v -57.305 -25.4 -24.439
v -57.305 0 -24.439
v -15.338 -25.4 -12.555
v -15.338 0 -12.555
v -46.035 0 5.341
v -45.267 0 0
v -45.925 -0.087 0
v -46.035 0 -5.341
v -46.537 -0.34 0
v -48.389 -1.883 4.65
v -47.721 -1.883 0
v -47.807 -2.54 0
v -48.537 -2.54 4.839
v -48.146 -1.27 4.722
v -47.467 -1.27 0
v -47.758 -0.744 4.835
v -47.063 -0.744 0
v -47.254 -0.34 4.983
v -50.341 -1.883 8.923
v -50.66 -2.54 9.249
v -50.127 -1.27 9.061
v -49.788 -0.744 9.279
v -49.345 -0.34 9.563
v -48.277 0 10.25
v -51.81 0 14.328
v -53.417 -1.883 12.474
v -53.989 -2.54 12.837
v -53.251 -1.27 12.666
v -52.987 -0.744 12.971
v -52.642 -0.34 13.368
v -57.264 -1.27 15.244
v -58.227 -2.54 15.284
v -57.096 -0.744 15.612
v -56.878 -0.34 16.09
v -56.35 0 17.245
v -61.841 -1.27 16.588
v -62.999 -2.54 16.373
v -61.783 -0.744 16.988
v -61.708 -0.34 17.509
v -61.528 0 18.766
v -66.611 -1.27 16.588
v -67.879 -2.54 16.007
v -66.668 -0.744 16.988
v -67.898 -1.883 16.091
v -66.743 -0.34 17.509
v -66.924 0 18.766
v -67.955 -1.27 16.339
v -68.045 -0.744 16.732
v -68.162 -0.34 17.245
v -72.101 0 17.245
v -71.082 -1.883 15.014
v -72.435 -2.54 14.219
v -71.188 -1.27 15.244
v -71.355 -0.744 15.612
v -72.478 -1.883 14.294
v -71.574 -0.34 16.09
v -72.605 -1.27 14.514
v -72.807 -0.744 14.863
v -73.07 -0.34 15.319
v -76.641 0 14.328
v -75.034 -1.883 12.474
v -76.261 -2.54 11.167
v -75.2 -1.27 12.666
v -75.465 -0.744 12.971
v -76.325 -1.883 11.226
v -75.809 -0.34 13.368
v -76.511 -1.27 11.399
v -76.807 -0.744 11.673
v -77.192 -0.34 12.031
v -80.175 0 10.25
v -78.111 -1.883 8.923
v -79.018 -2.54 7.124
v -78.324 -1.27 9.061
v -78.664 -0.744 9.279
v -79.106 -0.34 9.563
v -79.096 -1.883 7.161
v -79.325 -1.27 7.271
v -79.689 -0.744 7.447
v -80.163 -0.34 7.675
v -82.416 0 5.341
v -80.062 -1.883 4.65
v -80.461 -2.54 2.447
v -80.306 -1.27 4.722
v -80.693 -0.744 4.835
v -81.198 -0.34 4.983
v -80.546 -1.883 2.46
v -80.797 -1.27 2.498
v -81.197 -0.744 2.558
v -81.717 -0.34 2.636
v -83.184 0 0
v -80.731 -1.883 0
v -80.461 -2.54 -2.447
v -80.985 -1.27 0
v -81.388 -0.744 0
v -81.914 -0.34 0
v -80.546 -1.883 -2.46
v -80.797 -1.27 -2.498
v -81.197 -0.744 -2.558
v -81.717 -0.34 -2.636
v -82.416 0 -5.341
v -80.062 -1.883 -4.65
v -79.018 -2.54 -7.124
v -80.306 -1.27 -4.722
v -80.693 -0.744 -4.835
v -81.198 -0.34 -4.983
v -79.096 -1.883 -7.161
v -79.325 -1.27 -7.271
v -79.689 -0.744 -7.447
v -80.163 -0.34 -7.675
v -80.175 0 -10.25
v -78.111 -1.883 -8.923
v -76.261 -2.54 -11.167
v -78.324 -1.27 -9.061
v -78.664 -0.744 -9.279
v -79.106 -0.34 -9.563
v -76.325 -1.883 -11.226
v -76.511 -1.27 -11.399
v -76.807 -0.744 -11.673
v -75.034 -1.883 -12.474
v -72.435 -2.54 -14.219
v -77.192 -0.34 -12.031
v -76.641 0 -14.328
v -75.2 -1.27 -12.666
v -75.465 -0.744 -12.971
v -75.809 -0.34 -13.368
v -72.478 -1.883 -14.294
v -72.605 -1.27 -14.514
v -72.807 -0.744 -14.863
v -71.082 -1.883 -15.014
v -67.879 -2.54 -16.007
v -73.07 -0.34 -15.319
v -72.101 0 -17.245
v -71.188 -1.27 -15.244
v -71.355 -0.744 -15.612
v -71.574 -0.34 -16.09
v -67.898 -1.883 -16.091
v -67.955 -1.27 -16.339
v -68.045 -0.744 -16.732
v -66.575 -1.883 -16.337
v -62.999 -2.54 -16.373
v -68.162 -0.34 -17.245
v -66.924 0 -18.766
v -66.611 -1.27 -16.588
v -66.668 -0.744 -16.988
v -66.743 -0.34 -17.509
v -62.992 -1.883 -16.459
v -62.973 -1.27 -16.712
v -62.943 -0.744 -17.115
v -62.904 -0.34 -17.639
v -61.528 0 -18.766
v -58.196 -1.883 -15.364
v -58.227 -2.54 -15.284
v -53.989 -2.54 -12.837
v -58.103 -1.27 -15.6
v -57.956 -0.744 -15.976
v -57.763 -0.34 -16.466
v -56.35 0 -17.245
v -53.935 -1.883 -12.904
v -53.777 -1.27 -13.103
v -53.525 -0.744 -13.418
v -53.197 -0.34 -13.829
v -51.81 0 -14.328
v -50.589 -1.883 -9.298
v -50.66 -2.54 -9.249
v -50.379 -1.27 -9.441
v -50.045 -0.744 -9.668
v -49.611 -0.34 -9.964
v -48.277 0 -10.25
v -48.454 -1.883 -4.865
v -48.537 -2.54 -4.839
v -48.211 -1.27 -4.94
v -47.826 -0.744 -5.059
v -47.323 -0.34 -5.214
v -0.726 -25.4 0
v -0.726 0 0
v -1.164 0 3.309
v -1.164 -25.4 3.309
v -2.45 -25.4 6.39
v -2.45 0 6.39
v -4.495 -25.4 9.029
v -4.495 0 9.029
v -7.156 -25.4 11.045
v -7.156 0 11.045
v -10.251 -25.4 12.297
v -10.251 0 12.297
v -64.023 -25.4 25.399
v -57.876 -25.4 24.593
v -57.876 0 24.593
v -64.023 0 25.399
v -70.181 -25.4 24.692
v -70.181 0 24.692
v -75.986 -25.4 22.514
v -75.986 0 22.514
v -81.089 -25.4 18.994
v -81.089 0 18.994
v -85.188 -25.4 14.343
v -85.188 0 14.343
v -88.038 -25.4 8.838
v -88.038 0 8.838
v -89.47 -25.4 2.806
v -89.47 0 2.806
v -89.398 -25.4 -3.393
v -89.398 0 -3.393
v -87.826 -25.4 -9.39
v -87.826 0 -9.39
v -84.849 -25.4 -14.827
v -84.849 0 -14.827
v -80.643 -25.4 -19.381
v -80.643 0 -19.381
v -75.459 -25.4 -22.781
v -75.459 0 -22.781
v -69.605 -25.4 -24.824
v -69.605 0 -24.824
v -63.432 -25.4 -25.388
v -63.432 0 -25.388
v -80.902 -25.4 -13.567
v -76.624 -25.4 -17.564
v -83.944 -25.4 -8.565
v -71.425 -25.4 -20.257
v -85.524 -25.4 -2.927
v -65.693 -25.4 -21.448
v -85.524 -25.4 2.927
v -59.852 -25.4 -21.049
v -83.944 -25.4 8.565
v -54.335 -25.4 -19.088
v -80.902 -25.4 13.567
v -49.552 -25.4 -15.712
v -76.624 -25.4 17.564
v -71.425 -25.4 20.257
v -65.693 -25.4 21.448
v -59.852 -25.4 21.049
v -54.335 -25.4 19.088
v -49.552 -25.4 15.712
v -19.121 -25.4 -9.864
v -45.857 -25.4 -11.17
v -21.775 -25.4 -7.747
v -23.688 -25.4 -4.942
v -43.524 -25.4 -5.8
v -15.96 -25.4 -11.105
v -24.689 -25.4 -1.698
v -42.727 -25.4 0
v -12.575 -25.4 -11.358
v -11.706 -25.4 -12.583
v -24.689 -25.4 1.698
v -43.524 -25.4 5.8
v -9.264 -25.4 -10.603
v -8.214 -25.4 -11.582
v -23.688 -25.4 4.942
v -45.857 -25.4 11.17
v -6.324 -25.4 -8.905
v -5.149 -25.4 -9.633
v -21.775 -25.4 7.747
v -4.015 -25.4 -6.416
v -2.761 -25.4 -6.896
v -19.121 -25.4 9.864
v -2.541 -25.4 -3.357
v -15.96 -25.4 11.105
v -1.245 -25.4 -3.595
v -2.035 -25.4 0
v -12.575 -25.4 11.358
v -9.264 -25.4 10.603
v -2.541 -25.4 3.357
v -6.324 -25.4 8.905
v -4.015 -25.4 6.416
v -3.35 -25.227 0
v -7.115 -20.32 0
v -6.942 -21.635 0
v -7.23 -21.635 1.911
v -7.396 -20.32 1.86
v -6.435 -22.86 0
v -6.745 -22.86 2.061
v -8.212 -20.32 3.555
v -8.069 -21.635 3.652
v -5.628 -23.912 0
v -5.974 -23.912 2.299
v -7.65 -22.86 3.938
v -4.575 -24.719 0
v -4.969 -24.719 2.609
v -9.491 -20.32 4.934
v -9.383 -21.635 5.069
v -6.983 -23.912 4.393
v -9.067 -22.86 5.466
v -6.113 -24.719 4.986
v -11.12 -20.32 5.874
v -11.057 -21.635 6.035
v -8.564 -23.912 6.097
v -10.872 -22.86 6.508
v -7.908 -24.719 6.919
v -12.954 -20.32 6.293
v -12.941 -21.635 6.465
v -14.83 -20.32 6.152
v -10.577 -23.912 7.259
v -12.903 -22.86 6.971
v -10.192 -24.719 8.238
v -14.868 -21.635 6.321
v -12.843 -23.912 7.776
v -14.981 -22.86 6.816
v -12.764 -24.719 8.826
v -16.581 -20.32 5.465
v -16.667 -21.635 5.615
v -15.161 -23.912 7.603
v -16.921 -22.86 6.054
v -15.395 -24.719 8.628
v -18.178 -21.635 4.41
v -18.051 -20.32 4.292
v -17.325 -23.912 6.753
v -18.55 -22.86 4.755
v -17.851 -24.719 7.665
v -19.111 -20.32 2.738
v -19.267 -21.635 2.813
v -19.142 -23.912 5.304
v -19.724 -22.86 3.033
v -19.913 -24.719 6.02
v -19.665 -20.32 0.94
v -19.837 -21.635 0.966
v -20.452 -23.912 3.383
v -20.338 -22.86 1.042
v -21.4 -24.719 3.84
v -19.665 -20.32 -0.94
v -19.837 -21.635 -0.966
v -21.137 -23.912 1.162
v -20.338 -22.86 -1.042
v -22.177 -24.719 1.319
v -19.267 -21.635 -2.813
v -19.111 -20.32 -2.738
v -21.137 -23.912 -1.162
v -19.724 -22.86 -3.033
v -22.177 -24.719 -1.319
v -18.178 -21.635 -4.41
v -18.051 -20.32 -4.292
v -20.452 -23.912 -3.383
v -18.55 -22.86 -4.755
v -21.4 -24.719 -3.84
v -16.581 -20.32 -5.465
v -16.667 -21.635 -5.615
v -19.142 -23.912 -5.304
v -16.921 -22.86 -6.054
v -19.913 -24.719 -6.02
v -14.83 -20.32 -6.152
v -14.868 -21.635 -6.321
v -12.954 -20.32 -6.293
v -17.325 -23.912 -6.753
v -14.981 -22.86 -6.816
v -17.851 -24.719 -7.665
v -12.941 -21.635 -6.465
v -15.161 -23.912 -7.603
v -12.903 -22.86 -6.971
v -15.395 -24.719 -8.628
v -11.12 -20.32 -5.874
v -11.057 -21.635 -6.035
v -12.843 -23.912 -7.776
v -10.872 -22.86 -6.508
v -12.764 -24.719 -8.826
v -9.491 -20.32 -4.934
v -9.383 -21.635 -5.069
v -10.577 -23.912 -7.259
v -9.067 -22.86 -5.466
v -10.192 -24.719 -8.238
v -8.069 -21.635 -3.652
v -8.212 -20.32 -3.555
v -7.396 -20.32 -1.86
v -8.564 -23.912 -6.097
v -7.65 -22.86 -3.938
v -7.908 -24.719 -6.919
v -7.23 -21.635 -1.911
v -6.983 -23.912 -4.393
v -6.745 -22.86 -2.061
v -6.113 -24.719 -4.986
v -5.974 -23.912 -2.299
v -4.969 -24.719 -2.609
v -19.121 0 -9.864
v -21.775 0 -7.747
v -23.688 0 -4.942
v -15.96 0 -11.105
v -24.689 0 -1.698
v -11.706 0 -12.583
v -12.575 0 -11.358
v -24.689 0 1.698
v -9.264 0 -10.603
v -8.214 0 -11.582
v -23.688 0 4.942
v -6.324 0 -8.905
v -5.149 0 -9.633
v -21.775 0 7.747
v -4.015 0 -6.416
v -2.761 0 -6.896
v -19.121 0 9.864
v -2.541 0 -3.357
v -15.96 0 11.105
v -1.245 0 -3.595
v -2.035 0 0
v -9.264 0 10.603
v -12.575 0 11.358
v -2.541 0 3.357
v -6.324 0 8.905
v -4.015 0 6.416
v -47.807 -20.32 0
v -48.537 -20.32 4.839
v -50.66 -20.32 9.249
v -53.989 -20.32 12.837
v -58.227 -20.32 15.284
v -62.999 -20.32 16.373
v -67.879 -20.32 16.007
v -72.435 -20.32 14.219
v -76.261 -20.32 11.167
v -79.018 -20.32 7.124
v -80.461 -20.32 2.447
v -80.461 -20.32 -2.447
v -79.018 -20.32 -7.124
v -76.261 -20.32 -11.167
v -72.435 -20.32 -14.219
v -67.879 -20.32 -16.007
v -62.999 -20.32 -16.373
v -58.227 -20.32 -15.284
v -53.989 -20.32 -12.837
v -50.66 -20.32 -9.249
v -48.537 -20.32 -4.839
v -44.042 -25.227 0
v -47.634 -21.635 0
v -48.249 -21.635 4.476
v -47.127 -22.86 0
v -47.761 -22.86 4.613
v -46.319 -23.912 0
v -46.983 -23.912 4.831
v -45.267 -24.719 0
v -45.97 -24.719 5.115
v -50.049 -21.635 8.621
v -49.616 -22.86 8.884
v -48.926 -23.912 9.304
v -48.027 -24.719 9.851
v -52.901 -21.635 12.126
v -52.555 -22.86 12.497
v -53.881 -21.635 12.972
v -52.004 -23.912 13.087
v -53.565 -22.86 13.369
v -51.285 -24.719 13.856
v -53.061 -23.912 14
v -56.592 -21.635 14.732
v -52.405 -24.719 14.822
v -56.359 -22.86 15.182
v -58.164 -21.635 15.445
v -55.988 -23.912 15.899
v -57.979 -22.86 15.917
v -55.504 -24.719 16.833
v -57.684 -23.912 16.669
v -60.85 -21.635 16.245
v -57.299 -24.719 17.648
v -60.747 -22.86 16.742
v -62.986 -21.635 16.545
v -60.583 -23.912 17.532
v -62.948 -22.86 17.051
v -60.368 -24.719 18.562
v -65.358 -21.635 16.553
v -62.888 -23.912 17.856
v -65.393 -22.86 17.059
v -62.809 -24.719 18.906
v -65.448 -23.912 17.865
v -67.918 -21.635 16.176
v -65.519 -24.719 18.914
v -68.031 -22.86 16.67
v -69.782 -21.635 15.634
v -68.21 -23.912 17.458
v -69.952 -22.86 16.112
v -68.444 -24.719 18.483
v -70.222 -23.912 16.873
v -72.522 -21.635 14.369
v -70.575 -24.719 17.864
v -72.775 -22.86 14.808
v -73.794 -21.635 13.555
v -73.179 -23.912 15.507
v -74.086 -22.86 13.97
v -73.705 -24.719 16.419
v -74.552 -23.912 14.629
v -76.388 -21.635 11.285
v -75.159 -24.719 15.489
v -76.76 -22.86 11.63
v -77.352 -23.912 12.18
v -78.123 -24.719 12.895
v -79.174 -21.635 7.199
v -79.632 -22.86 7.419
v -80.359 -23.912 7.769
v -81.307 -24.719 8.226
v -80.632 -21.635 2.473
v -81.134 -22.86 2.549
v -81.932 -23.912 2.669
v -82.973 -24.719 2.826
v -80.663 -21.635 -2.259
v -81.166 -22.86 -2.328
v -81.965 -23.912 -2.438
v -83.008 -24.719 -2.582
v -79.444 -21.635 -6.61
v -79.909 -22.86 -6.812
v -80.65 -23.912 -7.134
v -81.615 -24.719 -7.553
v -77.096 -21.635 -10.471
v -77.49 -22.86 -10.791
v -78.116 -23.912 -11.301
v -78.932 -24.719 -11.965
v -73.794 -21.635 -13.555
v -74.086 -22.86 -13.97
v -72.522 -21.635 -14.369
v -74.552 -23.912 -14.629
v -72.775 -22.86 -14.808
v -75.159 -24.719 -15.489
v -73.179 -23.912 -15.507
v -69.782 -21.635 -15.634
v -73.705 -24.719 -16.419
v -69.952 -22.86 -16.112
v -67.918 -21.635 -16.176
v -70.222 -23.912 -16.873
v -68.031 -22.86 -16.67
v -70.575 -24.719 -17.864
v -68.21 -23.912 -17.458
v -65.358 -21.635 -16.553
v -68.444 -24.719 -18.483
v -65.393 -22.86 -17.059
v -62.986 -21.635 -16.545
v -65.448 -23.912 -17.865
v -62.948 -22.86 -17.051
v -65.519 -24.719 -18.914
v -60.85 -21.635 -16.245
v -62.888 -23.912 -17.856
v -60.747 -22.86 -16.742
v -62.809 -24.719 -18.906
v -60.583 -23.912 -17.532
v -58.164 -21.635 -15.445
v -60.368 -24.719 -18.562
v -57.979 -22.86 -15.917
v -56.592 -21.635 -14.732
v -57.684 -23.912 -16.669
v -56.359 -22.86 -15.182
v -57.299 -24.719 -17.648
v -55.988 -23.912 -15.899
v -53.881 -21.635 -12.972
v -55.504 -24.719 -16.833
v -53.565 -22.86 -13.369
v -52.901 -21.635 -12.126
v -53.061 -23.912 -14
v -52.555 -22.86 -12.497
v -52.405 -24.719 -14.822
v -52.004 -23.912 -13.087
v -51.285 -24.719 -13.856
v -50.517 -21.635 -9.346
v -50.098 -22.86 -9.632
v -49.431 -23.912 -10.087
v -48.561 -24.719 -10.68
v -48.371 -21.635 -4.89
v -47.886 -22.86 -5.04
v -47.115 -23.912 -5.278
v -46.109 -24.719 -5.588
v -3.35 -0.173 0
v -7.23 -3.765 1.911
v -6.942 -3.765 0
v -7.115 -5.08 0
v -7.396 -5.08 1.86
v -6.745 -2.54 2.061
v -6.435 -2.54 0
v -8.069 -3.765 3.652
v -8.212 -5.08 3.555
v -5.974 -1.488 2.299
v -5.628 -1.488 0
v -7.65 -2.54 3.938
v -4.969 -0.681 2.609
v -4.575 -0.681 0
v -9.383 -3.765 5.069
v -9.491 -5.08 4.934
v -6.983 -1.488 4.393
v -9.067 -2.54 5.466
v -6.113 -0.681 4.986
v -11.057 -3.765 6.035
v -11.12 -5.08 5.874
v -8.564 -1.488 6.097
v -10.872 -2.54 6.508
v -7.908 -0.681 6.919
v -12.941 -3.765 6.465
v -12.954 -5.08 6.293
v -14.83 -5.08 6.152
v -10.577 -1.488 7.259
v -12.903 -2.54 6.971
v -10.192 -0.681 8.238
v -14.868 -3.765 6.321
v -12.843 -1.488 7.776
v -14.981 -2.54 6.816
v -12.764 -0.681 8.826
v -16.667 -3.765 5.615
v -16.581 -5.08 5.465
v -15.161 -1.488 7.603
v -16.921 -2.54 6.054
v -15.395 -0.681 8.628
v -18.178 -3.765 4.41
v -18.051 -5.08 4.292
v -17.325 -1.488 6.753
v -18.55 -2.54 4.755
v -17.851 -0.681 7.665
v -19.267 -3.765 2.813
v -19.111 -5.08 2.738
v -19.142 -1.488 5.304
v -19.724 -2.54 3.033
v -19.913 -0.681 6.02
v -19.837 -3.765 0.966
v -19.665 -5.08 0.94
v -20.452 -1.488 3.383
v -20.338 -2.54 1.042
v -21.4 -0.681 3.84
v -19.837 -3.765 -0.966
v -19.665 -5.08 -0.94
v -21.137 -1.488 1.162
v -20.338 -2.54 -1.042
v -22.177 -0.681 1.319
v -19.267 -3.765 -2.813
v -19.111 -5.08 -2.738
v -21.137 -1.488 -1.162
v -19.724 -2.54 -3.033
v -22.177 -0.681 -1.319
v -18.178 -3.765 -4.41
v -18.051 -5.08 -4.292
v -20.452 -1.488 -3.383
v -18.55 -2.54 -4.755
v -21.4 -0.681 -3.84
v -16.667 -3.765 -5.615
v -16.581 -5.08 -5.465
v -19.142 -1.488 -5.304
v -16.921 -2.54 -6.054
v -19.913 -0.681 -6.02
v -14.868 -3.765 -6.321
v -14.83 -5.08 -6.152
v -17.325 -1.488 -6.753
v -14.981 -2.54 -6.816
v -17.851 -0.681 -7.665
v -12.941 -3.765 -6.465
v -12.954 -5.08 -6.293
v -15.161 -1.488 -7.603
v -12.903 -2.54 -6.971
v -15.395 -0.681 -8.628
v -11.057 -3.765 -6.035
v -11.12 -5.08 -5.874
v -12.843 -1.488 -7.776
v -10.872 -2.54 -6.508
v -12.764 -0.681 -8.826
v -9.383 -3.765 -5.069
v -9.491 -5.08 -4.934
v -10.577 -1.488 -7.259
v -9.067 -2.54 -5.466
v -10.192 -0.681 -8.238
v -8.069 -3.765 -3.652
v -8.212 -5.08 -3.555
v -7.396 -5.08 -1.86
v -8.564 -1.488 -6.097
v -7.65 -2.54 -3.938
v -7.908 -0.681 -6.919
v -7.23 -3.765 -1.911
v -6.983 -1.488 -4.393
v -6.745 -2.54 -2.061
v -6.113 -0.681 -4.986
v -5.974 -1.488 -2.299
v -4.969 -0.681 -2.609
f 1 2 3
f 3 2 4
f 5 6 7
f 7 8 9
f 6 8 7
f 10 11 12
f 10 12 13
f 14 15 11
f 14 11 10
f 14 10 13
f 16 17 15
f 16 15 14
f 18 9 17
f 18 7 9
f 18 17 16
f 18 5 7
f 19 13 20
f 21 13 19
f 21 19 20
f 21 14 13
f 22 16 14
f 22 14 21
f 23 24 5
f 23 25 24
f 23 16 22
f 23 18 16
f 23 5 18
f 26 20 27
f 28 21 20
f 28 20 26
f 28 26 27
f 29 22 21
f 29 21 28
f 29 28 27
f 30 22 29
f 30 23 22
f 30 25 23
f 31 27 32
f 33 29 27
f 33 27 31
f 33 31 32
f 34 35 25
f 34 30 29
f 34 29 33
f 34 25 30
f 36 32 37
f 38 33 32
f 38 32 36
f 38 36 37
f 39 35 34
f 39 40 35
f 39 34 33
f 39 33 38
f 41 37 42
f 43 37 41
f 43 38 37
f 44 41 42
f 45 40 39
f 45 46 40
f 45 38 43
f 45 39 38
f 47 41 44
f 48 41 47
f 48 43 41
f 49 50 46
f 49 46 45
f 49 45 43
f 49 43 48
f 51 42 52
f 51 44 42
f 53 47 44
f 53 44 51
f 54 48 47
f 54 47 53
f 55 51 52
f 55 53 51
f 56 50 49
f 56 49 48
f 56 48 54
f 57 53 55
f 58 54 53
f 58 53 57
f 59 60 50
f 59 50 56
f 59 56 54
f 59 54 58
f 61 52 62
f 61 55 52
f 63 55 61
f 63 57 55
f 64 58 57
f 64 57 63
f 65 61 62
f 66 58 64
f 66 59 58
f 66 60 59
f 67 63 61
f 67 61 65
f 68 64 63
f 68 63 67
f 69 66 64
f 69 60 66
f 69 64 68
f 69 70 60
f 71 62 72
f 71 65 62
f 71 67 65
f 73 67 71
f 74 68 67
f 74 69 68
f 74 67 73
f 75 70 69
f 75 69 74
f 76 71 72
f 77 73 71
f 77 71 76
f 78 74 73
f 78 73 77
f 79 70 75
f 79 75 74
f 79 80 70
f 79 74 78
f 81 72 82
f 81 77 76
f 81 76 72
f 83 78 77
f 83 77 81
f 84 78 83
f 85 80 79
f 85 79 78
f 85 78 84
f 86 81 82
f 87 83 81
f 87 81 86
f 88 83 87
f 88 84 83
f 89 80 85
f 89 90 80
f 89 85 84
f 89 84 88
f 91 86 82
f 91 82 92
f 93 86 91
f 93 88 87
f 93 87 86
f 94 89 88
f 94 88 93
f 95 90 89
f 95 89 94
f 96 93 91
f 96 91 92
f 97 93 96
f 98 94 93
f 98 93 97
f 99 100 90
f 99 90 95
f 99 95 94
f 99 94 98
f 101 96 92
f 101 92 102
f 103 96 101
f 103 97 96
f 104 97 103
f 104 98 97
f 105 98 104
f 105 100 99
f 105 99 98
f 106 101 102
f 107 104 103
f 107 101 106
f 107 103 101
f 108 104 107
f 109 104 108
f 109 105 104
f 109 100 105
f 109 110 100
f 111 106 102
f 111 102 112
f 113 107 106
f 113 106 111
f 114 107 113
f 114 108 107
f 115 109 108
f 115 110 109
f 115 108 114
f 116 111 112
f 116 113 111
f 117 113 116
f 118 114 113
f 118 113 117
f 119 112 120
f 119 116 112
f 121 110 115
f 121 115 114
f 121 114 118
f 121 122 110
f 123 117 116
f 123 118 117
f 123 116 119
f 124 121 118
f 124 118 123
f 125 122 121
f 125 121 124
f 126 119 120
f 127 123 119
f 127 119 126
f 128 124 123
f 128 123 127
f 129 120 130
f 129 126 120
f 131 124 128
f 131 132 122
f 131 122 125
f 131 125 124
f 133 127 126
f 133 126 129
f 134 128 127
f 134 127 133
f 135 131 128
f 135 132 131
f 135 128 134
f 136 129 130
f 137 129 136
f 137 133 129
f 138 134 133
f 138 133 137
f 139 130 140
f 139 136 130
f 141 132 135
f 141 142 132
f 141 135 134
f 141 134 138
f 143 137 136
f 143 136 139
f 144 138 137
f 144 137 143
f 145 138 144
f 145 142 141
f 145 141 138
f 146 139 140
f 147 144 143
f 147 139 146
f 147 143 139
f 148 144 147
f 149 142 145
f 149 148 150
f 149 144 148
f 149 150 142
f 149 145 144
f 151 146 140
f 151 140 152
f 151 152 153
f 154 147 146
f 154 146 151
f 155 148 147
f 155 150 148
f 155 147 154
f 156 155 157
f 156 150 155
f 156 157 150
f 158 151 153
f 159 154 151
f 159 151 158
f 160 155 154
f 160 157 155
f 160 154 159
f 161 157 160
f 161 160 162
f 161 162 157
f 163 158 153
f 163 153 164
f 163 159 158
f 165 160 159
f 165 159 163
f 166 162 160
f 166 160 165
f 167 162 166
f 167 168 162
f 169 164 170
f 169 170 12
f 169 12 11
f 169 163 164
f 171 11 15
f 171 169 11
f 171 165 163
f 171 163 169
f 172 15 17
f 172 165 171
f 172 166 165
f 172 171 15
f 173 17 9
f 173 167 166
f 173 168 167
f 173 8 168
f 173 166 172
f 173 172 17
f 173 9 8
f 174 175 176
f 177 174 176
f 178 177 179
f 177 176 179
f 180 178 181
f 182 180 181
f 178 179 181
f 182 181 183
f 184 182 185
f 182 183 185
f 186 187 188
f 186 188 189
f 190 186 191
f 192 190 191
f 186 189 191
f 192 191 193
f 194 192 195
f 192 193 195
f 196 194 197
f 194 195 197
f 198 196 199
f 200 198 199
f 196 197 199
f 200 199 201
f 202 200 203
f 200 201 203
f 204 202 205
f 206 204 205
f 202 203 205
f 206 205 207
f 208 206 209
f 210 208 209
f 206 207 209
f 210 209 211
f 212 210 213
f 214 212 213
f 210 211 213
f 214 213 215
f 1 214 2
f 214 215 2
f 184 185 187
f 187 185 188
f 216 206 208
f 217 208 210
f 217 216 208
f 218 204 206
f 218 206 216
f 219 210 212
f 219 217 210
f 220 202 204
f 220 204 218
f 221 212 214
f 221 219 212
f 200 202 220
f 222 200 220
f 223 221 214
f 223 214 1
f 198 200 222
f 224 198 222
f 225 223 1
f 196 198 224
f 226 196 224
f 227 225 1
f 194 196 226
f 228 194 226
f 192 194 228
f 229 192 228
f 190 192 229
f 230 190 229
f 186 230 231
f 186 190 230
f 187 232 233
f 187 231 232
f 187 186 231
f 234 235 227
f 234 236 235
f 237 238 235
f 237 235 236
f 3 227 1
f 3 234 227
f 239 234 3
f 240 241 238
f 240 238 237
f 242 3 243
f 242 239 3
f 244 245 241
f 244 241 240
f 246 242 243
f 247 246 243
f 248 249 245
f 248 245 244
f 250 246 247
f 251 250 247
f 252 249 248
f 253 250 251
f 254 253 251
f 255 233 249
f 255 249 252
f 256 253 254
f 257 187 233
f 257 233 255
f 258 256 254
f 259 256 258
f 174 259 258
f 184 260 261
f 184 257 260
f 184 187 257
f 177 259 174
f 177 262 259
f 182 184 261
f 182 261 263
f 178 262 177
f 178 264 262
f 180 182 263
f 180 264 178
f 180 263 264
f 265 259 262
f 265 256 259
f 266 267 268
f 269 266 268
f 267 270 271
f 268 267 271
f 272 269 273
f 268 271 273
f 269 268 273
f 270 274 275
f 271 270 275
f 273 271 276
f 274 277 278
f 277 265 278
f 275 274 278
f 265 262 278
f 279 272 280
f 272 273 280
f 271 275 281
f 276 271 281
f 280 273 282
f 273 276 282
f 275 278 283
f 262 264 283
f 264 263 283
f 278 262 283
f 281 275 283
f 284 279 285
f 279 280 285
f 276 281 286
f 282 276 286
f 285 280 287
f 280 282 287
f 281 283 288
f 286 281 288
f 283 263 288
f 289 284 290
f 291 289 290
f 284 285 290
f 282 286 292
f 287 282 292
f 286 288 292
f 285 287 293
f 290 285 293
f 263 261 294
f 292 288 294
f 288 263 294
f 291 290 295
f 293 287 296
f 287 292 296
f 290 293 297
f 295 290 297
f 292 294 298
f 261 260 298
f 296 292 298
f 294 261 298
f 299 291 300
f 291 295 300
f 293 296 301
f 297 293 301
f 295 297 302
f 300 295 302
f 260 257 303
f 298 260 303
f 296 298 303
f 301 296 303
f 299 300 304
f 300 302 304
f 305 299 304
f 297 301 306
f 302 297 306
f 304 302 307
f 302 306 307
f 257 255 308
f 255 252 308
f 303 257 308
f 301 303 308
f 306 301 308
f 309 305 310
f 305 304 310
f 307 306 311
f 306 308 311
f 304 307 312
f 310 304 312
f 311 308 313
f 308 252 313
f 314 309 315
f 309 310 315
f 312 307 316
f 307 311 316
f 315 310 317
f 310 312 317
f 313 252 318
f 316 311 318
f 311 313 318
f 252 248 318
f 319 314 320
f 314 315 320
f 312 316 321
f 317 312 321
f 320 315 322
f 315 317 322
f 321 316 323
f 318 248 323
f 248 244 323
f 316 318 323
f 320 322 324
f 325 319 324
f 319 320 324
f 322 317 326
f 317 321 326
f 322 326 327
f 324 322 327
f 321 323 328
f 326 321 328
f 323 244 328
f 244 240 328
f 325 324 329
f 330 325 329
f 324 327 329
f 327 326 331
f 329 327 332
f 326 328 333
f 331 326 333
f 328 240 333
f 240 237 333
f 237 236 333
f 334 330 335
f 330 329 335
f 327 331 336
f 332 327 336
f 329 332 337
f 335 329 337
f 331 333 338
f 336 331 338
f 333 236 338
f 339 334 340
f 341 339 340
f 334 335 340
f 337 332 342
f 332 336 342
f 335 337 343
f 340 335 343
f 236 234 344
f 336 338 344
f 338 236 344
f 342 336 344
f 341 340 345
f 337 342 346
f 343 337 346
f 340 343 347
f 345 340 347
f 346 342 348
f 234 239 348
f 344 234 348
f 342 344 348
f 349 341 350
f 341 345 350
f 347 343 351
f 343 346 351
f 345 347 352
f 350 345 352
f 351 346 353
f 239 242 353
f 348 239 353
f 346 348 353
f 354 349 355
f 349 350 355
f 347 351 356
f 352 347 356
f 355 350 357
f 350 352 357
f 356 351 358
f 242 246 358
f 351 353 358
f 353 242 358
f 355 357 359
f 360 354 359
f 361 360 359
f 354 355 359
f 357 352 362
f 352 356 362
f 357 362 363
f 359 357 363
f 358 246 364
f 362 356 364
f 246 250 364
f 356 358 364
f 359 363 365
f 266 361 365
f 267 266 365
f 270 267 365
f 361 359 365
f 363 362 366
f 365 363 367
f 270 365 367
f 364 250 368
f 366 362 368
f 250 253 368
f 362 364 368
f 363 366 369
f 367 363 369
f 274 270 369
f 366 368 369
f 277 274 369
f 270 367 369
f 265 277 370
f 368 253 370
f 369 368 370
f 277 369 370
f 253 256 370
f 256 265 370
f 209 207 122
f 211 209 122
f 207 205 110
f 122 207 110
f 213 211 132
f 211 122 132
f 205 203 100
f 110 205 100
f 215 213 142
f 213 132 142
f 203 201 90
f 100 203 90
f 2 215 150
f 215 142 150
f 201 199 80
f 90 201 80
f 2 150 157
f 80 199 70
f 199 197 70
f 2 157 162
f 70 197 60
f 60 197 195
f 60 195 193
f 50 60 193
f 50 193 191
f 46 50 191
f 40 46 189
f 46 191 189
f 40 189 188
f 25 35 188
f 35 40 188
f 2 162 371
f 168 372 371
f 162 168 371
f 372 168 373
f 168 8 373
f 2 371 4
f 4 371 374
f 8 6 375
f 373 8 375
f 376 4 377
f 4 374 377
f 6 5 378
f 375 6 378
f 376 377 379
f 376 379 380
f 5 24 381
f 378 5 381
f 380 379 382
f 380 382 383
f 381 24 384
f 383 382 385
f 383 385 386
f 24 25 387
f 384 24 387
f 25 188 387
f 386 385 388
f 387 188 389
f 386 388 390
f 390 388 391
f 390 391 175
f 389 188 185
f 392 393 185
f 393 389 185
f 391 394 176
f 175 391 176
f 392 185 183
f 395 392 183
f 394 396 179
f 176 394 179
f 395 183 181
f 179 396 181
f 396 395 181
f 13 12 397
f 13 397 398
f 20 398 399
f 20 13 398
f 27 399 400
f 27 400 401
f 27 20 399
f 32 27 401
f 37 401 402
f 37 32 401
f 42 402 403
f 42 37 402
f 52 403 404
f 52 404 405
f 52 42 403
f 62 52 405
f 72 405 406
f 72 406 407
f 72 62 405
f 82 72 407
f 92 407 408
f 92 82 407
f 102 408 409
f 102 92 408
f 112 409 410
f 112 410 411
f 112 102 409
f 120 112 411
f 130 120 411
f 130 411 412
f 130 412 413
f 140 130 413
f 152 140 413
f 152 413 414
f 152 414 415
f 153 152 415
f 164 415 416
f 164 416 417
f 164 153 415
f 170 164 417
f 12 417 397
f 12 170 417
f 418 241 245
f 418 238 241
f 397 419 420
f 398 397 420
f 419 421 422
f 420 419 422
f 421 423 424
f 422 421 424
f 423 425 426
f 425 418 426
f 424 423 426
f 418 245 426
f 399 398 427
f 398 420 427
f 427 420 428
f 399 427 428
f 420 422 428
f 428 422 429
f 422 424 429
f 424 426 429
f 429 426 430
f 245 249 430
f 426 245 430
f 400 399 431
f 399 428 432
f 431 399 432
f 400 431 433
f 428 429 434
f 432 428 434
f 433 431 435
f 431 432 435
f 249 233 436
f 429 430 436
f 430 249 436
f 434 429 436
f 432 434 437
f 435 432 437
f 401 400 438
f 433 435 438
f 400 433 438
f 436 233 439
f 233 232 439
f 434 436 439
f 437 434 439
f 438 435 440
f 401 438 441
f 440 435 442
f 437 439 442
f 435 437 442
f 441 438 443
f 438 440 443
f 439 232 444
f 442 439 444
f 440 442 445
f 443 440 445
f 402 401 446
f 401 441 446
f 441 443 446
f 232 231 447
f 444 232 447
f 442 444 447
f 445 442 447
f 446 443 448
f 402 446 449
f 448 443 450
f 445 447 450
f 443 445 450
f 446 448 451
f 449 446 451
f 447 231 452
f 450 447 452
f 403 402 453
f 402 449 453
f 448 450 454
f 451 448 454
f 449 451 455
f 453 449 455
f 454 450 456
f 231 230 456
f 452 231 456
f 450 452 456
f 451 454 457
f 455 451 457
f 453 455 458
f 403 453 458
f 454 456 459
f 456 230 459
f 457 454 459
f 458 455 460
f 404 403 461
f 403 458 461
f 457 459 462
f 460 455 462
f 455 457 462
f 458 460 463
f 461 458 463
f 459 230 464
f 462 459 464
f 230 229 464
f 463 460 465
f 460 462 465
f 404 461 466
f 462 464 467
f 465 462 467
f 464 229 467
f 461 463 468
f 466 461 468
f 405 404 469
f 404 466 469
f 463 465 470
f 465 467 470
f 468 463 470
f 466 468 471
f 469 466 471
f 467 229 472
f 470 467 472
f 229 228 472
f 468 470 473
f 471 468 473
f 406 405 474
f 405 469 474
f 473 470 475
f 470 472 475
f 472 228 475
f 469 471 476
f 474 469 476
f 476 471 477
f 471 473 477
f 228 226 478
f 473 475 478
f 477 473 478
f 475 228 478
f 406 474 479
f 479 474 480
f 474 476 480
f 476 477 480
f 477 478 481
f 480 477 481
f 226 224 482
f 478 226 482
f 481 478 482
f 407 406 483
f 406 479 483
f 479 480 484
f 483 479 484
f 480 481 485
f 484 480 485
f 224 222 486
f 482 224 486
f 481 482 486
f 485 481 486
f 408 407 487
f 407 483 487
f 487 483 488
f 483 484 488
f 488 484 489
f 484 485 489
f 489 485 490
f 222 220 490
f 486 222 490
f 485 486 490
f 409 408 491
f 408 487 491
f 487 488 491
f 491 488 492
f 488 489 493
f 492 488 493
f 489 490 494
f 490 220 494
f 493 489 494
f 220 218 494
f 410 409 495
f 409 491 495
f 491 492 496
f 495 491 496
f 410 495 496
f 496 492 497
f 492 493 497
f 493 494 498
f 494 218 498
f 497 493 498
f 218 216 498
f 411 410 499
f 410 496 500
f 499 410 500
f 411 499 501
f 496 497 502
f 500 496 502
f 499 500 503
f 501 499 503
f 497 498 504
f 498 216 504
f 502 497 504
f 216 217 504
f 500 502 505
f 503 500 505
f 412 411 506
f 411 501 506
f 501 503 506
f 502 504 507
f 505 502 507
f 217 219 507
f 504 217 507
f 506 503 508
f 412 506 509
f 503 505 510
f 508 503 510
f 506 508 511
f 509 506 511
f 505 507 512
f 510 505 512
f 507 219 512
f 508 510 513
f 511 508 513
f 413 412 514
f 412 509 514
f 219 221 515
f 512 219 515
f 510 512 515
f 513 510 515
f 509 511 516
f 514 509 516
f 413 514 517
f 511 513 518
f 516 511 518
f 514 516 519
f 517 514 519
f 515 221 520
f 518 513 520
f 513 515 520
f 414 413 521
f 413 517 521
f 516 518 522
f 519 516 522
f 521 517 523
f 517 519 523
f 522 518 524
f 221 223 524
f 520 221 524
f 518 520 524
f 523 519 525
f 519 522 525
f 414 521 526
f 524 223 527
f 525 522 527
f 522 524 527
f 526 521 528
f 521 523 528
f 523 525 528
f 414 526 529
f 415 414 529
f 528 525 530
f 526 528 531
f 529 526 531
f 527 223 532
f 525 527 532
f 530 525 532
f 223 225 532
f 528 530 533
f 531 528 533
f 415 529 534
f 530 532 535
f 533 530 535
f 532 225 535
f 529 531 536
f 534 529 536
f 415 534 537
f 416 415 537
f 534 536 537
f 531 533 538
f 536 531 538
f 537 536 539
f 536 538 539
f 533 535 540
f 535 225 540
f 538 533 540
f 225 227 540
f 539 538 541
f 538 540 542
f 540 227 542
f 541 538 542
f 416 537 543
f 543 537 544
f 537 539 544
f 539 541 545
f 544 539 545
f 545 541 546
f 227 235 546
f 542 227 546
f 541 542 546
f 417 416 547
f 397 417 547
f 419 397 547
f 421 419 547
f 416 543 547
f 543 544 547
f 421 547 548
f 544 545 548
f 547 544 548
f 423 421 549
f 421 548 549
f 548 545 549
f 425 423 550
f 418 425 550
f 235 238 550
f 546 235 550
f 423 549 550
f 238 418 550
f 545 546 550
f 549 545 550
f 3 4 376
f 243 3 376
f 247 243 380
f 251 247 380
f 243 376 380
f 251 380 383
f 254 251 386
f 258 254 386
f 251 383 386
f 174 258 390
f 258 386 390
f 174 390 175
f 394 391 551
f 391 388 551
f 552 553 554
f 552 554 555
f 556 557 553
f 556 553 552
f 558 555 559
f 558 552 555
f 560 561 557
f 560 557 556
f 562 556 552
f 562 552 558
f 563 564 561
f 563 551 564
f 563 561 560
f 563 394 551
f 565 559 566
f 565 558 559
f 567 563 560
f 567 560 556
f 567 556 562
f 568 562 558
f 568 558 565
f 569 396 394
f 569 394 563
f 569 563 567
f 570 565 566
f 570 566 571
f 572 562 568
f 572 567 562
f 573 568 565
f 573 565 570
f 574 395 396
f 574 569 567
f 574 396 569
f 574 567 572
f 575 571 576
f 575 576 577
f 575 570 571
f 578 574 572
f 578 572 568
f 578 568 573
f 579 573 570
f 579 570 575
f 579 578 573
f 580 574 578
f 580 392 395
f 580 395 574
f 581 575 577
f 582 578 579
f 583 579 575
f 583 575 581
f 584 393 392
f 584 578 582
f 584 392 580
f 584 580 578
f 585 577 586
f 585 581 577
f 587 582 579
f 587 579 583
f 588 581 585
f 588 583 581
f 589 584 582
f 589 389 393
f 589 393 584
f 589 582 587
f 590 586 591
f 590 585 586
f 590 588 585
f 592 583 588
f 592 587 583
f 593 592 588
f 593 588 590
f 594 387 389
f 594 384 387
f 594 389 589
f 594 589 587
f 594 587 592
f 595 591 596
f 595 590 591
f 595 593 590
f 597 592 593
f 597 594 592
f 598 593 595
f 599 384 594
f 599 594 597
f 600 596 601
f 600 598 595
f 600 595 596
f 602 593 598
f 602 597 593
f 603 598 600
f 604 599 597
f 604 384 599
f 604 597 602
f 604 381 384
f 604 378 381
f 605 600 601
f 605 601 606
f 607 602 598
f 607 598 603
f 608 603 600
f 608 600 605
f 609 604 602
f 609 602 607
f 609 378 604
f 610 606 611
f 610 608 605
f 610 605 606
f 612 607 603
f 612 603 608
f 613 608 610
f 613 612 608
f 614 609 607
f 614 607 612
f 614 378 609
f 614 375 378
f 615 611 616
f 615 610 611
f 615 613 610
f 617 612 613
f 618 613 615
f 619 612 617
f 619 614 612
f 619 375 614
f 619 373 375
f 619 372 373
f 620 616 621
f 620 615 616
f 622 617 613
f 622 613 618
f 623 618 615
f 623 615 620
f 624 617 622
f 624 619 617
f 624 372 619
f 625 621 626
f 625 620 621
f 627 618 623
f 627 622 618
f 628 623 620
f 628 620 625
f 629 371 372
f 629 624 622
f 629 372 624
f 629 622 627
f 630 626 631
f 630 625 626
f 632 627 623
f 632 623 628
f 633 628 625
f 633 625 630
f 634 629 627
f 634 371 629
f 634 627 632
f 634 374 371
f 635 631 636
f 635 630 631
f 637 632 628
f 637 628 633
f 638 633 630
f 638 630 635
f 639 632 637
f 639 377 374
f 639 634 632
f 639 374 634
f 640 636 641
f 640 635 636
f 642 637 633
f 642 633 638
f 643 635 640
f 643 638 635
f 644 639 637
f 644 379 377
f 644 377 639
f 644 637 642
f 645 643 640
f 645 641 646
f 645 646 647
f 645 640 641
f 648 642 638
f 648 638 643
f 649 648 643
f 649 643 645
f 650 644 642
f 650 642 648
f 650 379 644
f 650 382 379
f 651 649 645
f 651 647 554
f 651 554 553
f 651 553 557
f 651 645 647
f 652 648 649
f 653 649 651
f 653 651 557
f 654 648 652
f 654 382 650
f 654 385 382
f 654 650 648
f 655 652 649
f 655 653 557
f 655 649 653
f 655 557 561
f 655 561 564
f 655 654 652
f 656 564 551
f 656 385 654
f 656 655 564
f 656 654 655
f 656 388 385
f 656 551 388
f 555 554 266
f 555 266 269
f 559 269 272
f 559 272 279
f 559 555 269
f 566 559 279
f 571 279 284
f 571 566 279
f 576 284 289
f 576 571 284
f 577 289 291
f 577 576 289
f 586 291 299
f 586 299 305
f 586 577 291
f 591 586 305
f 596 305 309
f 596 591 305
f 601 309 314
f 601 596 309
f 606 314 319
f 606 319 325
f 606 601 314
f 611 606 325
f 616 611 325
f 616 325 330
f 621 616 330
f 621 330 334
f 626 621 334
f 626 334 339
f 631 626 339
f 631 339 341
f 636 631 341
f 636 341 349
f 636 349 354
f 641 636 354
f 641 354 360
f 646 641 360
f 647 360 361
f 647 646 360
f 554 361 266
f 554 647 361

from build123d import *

# Parameters (mm, degrees)
F0_R     = 16.418587
F0_R_2   = 6.310263
F1_DEPTH = 25.4
F2_R     = 5.08
F3_R     = 2.54


with BuildPart() as f1:
    # F0 (on Front) → F1 (new body)
    with BuildSketch(Plane.XZ):
        with BuildLine():
            ThreePointArc((-57.30524, -24.439051), (-43.965646, -15.3196), (-38.825702, 0))
            ThreePointArc((-38.825702, 0), (-44.145238, 15.55426), (-57.875702, 24.593444))
            ThreePointArc((-57.875702, 24.593444), (-89.623983, -0.295493), (-57.30524, -24.439051))
        make_face()
        with Locations((-64.225702, 0)):
            Circle(F0_R, mode=Mode.SUBTRACT)
        with BuildLine():
            ThreePointArc((-57.875702, 24.593444), (-44.145238, 15.55426), (-38.825702, 0))
            ThreePointArc((-38.825702, 0), (-43.965646, -15.3196), (-57.30524, -24.439051))
            Line((-57.30524, -24.439051), (-15.338253, -12.555164))
            ThreePointArc((-15.338253, -12.555164), (-25.867667, 2.547056), (-10.250702, 12.296722))
            Line((-10.250702, 12.296722), (-57.875702, 24.593444))
        make_face()
        with BuildLine():
            ThreePointArc((-0.725702, 0), (-3.38547, 7.77713), (-10.250702, 12.296722))
            ThreePointArc((-10.250702, 12.296722), (-25.867667, 2.547056), (-15.338253, -12.555164))
            ThreePointArc((-15.338253, -12.555164), (-5.149211, -9.632741), (-0.725702, 0))
        make_face()
        with Locations((-13.425702, 0)):
            Circle(F0_R_2, mode=Mode.SUBTRACT)
    extrude(amount=F1_DEPTH)

    # F2
    f2_edges = [f1.edges().sort_by_distance(p)[0] for p in [
        (-80.644288, -25.4, 0),
        (-7.115439, -12.7, 0),
        (-19.735965, 0, 0),
        (-19.735965, -25.4, 0),
    ]]
    fillet(f2_edges, radius=F2_R)

    # F3
    f3_edges = [f1.edges().sort_by_distance(p)[0] for p in [
        (-80.644288, 0, 0),
    ]]
    fillet(f3_edges, radius=F3_R)


solid = f1.part
